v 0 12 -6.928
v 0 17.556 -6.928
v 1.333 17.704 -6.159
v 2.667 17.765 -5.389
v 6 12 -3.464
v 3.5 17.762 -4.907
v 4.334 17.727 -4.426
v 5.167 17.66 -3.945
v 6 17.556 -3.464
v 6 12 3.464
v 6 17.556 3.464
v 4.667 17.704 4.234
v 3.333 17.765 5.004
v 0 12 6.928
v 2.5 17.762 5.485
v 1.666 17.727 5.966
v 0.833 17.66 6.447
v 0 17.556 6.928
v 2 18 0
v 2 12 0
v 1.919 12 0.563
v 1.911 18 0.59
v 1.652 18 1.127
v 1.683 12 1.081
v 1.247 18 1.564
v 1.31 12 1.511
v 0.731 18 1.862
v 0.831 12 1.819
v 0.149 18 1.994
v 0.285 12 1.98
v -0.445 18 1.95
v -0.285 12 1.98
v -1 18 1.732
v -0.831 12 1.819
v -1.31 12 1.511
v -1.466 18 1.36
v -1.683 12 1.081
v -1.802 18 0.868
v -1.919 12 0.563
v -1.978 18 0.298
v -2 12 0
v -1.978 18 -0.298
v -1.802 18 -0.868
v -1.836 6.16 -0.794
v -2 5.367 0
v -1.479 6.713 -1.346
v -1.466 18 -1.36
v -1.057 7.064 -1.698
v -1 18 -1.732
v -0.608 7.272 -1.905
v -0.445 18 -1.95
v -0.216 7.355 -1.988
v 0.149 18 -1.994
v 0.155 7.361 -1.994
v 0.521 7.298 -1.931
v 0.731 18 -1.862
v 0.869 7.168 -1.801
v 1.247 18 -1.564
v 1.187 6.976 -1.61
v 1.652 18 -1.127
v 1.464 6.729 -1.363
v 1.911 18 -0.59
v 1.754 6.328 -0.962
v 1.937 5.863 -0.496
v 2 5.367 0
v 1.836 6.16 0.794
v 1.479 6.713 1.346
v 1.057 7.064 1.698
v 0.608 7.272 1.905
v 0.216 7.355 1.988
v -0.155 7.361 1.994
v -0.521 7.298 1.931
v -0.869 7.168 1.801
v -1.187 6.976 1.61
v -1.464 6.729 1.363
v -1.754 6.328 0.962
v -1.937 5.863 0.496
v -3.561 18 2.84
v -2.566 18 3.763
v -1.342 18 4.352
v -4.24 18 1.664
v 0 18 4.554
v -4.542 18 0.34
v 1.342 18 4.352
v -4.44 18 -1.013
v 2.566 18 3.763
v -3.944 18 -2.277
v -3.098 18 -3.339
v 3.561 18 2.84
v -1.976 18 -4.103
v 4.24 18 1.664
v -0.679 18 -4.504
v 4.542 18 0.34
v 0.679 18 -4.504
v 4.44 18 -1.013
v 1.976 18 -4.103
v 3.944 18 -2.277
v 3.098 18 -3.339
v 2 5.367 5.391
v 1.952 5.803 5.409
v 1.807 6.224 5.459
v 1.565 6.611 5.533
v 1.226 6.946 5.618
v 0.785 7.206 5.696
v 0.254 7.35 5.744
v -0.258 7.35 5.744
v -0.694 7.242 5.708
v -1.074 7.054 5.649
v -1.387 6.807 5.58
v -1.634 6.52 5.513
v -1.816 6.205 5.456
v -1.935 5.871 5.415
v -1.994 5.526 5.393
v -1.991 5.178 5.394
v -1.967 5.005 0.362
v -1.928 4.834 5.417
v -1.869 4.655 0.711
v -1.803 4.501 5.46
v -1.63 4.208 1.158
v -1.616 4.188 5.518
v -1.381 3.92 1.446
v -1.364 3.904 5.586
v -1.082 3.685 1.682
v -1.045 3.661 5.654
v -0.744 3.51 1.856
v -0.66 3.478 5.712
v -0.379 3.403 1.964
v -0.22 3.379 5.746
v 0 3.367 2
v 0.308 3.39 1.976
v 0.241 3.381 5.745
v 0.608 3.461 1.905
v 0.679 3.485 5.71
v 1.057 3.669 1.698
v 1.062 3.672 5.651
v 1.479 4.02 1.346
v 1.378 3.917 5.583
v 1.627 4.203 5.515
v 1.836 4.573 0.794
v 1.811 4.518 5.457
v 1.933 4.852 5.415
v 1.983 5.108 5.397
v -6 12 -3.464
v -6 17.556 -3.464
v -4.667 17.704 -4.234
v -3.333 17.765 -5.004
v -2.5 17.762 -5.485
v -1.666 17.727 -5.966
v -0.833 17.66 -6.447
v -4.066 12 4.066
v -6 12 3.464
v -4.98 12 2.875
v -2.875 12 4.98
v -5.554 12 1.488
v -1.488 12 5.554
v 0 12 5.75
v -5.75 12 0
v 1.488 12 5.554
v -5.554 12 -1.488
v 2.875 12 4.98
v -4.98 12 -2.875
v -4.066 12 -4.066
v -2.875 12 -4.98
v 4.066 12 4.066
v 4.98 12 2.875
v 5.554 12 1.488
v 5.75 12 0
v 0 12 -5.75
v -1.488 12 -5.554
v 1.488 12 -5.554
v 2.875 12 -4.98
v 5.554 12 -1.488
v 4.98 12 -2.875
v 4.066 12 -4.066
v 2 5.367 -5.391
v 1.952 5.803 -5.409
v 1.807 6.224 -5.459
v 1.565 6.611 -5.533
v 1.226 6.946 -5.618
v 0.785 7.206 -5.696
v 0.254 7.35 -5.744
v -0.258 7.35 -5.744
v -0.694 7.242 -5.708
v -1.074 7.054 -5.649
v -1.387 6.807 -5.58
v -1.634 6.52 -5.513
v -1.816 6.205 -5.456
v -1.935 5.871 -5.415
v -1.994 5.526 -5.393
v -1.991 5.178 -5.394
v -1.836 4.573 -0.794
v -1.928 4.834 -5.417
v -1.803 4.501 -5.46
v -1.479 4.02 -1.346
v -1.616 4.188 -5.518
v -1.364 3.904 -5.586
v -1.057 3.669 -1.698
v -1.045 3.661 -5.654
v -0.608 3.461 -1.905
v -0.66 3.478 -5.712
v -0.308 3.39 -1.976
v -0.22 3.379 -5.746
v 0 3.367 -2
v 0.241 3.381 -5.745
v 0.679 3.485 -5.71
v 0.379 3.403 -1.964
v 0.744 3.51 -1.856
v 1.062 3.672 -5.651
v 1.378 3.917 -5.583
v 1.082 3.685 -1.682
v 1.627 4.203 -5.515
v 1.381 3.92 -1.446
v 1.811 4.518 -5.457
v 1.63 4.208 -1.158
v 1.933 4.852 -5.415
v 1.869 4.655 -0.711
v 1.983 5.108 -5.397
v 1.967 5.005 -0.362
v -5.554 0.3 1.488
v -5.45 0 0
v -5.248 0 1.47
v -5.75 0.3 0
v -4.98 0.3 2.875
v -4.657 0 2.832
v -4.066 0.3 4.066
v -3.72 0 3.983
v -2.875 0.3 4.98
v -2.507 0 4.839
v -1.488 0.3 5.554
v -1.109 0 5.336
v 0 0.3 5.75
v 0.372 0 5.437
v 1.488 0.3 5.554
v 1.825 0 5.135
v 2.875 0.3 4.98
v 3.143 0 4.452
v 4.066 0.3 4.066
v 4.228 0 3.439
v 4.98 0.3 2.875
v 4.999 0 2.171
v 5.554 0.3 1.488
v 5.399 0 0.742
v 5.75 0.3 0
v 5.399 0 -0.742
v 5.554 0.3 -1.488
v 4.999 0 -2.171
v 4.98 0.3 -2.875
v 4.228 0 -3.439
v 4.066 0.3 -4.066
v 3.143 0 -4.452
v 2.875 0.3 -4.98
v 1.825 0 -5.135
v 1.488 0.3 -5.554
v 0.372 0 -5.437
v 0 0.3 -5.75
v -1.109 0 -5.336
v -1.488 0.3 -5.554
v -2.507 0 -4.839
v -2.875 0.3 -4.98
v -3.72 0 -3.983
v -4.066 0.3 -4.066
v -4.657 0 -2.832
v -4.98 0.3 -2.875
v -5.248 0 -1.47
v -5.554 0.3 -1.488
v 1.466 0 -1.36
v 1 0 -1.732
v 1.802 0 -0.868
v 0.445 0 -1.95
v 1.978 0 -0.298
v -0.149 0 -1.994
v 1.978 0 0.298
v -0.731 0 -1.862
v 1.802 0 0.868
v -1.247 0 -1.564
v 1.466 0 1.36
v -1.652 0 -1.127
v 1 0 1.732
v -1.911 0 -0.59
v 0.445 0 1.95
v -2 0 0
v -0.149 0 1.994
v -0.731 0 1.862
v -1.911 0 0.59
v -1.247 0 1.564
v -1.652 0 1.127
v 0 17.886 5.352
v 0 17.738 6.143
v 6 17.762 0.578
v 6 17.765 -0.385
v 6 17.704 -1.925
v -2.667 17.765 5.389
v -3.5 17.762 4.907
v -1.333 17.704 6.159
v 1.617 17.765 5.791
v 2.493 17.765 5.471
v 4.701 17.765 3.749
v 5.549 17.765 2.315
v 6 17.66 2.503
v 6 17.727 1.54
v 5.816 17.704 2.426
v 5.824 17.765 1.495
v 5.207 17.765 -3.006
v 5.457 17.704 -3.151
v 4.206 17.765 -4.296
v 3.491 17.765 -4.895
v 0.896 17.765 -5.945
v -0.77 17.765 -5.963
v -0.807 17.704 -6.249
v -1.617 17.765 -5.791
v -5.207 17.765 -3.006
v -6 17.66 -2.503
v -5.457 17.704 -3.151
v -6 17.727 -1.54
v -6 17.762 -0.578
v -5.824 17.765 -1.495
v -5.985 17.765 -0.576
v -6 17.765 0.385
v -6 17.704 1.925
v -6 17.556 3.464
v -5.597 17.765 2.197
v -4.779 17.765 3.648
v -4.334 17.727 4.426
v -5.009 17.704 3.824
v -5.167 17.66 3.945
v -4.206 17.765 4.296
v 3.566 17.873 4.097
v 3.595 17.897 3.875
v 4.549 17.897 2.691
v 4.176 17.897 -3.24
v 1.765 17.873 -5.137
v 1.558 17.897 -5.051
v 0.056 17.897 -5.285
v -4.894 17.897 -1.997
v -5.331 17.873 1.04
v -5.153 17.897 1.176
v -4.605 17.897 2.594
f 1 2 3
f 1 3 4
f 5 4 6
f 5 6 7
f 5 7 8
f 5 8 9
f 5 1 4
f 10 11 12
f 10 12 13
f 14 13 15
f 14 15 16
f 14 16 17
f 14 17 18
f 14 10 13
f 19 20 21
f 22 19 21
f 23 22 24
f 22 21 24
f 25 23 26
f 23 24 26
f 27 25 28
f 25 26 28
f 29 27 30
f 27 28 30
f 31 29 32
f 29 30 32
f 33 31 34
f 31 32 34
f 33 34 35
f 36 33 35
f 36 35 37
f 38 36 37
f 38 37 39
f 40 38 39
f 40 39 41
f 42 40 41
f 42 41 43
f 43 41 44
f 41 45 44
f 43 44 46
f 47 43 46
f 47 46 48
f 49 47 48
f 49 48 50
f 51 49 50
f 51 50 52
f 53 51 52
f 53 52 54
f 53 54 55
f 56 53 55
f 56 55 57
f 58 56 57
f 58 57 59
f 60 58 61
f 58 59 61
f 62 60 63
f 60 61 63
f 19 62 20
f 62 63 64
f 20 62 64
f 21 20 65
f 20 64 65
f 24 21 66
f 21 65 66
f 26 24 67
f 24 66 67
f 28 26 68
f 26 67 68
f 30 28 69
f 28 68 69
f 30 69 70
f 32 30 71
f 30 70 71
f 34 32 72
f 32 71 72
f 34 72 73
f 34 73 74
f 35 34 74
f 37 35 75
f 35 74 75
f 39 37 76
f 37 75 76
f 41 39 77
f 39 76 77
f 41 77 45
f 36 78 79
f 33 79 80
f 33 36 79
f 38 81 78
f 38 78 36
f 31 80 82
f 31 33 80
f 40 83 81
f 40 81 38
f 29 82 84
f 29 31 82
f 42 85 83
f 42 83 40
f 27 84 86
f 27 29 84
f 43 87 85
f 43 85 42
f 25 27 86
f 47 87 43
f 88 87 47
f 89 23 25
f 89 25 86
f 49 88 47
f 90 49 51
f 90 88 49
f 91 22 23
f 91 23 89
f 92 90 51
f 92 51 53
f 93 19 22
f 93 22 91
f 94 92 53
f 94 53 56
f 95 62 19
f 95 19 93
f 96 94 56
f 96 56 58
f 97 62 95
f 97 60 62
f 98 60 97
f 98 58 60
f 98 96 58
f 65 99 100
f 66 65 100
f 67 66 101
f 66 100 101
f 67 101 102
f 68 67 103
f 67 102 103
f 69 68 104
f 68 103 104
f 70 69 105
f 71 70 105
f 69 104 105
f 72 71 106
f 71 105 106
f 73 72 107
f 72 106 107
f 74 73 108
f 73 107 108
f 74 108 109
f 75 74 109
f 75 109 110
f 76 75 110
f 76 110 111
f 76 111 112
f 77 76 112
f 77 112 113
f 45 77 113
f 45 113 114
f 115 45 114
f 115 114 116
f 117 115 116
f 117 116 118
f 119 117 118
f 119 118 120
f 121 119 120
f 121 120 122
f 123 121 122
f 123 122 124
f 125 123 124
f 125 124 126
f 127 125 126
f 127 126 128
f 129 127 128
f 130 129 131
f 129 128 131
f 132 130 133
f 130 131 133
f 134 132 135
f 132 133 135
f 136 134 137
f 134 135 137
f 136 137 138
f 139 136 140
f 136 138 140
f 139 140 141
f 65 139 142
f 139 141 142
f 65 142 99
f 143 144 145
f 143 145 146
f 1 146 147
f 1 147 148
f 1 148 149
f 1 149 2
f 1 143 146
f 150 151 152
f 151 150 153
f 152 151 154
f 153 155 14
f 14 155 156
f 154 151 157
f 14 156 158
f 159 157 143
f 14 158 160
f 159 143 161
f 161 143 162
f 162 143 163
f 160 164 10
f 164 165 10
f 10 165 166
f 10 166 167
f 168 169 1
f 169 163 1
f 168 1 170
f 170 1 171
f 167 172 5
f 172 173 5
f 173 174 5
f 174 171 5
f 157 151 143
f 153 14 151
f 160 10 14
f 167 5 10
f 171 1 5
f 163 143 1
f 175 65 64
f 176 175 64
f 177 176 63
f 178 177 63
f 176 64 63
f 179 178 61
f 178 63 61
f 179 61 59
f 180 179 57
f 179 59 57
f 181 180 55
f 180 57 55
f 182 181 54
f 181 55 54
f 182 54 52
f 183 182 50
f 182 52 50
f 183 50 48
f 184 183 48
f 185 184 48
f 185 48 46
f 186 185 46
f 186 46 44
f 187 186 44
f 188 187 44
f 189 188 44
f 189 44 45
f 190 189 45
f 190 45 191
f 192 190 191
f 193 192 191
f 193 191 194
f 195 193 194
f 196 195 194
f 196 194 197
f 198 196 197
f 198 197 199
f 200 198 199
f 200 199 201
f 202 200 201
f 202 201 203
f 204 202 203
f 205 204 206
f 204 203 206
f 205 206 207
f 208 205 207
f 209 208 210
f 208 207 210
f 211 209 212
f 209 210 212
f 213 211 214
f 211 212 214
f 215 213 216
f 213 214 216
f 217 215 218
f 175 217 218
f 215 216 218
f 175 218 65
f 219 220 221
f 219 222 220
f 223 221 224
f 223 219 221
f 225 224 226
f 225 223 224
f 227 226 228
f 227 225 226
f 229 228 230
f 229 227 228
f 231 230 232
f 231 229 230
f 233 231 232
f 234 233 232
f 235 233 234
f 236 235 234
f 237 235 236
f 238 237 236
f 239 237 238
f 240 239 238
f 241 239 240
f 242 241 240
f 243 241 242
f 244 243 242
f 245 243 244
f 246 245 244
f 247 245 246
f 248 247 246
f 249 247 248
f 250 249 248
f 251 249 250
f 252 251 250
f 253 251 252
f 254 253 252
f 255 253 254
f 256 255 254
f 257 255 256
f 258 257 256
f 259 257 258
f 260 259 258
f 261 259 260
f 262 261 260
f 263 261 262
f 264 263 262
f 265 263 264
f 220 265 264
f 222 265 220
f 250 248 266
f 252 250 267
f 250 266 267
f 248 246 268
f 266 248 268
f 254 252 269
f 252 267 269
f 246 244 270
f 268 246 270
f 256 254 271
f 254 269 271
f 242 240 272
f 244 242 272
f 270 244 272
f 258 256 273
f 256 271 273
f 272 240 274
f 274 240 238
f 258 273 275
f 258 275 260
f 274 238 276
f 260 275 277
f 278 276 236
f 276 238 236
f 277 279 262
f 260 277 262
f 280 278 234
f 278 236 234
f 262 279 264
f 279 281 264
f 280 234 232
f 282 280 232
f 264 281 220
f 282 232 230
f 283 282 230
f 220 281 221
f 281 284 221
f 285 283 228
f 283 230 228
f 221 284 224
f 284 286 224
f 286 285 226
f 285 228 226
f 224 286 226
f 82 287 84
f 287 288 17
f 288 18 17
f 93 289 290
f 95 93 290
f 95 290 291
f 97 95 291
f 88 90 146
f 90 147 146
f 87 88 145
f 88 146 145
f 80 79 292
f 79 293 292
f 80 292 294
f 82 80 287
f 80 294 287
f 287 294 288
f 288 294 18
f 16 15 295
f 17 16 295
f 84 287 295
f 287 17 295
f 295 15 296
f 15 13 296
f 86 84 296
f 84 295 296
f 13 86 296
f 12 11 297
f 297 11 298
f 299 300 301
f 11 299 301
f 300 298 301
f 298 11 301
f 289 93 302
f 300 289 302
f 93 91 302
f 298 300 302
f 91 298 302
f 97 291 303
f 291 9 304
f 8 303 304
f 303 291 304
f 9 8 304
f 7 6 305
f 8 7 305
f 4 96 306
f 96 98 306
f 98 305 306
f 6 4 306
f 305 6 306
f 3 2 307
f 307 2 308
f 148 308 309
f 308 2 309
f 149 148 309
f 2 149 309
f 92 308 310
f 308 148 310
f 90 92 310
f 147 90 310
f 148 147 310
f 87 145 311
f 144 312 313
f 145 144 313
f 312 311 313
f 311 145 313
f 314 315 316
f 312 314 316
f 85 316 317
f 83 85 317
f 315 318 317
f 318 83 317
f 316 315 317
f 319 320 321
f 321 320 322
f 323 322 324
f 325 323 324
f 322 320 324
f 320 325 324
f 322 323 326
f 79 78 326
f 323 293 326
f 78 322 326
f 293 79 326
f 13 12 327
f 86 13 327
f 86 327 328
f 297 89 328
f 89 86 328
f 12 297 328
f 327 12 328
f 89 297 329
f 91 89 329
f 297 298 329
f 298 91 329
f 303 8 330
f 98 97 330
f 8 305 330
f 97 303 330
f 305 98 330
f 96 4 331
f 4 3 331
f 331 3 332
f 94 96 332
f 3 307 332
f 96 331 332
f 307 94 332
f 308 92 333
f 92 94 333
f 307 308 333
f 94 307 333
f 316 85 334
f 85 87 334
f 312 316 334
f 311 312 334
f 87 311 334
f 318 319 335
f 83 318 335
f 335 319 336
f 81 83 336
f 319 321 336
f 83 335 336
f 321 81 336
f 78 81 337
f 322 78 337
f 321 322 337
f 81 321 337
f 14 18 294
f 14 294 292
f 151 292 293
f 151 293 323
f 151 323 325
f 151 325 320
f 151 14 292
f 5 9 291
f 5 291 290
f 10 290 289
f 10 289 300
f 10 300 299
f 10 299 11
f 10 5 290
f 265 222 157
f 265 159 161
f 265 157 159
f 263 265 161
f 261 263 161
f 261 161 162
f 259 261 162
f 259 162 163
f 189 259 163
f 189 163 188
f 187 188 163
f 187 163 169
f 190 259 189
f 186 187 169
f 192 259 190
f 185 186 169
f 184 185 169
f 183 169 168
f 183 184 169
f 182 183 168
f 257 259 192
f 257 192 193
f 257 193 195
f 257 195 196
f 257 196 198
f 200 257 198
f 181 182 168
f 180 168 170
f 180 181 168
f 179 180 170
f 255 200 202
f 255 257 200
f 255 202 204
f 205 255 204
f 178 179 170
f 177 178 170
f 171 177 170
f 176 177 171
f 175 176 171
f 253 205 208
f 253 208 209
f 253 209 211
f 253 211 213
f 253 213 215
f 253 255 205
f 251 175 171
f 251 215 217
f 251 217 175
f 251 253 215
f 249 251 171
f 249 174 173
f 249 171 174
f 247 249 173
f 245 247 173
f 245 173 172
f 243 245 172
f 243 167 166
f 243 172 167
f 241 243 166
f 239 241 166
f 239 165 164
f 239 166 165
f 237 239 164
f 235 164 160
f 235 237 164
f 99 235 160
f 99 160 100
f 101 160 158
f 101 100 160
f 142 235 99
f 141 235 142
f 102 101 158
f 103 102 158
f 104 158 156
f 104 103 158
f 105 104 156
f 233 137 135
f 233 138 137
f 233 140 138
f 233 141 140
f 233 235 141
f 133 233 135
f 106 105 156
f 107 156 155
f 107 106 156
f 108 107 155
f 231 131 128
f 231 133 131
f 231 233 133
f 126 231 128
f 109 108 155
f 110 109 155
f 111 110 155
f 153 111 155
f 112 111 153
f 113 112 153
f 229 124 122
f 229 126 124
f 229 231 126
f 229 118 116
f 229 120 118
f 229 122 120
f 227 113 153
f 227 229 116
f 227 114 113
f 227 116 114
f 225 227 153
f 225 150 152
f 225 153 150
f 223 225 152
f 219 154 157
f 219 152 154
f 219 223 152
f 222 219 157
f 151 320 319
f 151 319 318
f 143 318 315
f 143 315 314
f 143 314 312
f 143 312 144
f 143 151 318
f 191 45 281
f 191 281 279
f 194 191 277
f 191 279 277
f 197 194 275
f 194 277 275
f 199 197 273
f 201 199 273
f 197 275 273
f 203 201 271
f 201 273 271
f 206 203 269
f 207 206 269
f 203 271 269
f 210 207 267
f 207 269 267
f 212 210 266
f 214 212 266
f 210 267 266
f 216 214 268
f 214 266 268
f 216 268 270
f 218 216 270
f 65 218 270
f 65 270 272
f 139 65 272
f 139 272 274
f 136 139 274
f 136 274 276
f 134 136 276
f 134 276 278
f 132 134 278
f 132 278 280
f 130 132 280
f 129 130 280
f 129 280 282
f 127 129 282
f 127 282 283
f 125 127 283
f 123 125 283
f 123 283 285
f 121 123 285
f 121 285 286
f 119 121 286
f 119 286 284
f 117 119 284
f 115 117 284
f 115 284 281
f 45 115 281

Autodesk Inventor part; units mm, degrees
ref_plane "YZ Plane" through (0, 0, 0) normal (1, 0, 0) x (0, 1, 0)
ref_plane "XZ Plane" through (0, 0, 0) normal (0, 1, 0) x (-1, 0, 0)
ref_plane "XY Plane" through (0, 0, 0) normal (0, 0, 1) x (1, 0, 0)
sketch "Sketch1" plane through (0, 0, 0) normal (0, 1, 0) x (-1, 0, 0)
  circle A0 centre (0, 0) radius 5.75
  circle A1 centre (0, 0) radius 2
  dimension "d0" = 4
  dimension "d1" = 11.5
extrude "Extrusion1" add sketch "Sketch1" along normal blind 12
sketch "Sketch2" plane through (0, 12, 0) normal (0, 1, 0) x (1, 0, 0)
  circle A0 centre (0, 0) radius 2
  line L0 (0, 6.9282) -> (6, 3.4641)
  line L1 (6, 3.4641) -> (6, -3.4641)
  line L2 (6, -3.4641) -> (0, -6.9282)
  line L3 (0, -6.9282) -> (-6, -3.4641)
  line L4 (-6, -3.4641) -> (-6, 3.4641)
  line L5 (-6, 3.4641) -> (0, 6.9282)
  dimension "d4" = 12
extrude "Extrusion2" add sketch "Sketch2" along normal blind 6
chamfer "Chamfer1" distance 0.3 angle 45 1 edges at (5.75, 0, 0)
sketch "Sketch3" plane through (0, 0, 0) normal (1, 0, 0) x (0, 1, 0)
  line L0 (16.8879, 9.0352) -> (19.8879, 9.0352)
  line L1 (18, 2) -> (18, -2) projected
  line L2 (18, 3.4641) -> (18, 6.9282) projected
  line L3 (-31.6303, 0) -> (26.5625, 0) projected
  line L4 (19.8879, 9.0352) -> (19.8879, 0)
  line L5 (19.8879, 0) -> (18, 0)
  arc A0 (18, 0) -> (16.8879, 9.0352) centre (-0.7575, 2.2772) ccw
  point P0 (0, 0)
  dimension "d10" = 9.0352
  dimension "d11" = 3
revolve "Revolution1" cut sketch "Sketch3" angle 360 about axis through (0, 0, 0) along (0, 1, 0)
sketch "Sketch4" plane through (0, 0, 0) normal (0, 0, 1) x (1, 0, 0)
  line L0 (0, 0) -> (0, 5.3666) construction
  circle A0 centre (0, 5.3666) radius 2
  dimension "d13" = 4
extrude "Extrusion3" cut sketch "Sketch4" against normal mid plane 30
thread "Thread1" size "M4x0.7" class "6H" standard "ANSI Metric M Profile" length 180
thread "Thread2" size "M4x0.7" class "6H" standard "ANSI Metric M Profile" length 180
properties part number "Coupler"
